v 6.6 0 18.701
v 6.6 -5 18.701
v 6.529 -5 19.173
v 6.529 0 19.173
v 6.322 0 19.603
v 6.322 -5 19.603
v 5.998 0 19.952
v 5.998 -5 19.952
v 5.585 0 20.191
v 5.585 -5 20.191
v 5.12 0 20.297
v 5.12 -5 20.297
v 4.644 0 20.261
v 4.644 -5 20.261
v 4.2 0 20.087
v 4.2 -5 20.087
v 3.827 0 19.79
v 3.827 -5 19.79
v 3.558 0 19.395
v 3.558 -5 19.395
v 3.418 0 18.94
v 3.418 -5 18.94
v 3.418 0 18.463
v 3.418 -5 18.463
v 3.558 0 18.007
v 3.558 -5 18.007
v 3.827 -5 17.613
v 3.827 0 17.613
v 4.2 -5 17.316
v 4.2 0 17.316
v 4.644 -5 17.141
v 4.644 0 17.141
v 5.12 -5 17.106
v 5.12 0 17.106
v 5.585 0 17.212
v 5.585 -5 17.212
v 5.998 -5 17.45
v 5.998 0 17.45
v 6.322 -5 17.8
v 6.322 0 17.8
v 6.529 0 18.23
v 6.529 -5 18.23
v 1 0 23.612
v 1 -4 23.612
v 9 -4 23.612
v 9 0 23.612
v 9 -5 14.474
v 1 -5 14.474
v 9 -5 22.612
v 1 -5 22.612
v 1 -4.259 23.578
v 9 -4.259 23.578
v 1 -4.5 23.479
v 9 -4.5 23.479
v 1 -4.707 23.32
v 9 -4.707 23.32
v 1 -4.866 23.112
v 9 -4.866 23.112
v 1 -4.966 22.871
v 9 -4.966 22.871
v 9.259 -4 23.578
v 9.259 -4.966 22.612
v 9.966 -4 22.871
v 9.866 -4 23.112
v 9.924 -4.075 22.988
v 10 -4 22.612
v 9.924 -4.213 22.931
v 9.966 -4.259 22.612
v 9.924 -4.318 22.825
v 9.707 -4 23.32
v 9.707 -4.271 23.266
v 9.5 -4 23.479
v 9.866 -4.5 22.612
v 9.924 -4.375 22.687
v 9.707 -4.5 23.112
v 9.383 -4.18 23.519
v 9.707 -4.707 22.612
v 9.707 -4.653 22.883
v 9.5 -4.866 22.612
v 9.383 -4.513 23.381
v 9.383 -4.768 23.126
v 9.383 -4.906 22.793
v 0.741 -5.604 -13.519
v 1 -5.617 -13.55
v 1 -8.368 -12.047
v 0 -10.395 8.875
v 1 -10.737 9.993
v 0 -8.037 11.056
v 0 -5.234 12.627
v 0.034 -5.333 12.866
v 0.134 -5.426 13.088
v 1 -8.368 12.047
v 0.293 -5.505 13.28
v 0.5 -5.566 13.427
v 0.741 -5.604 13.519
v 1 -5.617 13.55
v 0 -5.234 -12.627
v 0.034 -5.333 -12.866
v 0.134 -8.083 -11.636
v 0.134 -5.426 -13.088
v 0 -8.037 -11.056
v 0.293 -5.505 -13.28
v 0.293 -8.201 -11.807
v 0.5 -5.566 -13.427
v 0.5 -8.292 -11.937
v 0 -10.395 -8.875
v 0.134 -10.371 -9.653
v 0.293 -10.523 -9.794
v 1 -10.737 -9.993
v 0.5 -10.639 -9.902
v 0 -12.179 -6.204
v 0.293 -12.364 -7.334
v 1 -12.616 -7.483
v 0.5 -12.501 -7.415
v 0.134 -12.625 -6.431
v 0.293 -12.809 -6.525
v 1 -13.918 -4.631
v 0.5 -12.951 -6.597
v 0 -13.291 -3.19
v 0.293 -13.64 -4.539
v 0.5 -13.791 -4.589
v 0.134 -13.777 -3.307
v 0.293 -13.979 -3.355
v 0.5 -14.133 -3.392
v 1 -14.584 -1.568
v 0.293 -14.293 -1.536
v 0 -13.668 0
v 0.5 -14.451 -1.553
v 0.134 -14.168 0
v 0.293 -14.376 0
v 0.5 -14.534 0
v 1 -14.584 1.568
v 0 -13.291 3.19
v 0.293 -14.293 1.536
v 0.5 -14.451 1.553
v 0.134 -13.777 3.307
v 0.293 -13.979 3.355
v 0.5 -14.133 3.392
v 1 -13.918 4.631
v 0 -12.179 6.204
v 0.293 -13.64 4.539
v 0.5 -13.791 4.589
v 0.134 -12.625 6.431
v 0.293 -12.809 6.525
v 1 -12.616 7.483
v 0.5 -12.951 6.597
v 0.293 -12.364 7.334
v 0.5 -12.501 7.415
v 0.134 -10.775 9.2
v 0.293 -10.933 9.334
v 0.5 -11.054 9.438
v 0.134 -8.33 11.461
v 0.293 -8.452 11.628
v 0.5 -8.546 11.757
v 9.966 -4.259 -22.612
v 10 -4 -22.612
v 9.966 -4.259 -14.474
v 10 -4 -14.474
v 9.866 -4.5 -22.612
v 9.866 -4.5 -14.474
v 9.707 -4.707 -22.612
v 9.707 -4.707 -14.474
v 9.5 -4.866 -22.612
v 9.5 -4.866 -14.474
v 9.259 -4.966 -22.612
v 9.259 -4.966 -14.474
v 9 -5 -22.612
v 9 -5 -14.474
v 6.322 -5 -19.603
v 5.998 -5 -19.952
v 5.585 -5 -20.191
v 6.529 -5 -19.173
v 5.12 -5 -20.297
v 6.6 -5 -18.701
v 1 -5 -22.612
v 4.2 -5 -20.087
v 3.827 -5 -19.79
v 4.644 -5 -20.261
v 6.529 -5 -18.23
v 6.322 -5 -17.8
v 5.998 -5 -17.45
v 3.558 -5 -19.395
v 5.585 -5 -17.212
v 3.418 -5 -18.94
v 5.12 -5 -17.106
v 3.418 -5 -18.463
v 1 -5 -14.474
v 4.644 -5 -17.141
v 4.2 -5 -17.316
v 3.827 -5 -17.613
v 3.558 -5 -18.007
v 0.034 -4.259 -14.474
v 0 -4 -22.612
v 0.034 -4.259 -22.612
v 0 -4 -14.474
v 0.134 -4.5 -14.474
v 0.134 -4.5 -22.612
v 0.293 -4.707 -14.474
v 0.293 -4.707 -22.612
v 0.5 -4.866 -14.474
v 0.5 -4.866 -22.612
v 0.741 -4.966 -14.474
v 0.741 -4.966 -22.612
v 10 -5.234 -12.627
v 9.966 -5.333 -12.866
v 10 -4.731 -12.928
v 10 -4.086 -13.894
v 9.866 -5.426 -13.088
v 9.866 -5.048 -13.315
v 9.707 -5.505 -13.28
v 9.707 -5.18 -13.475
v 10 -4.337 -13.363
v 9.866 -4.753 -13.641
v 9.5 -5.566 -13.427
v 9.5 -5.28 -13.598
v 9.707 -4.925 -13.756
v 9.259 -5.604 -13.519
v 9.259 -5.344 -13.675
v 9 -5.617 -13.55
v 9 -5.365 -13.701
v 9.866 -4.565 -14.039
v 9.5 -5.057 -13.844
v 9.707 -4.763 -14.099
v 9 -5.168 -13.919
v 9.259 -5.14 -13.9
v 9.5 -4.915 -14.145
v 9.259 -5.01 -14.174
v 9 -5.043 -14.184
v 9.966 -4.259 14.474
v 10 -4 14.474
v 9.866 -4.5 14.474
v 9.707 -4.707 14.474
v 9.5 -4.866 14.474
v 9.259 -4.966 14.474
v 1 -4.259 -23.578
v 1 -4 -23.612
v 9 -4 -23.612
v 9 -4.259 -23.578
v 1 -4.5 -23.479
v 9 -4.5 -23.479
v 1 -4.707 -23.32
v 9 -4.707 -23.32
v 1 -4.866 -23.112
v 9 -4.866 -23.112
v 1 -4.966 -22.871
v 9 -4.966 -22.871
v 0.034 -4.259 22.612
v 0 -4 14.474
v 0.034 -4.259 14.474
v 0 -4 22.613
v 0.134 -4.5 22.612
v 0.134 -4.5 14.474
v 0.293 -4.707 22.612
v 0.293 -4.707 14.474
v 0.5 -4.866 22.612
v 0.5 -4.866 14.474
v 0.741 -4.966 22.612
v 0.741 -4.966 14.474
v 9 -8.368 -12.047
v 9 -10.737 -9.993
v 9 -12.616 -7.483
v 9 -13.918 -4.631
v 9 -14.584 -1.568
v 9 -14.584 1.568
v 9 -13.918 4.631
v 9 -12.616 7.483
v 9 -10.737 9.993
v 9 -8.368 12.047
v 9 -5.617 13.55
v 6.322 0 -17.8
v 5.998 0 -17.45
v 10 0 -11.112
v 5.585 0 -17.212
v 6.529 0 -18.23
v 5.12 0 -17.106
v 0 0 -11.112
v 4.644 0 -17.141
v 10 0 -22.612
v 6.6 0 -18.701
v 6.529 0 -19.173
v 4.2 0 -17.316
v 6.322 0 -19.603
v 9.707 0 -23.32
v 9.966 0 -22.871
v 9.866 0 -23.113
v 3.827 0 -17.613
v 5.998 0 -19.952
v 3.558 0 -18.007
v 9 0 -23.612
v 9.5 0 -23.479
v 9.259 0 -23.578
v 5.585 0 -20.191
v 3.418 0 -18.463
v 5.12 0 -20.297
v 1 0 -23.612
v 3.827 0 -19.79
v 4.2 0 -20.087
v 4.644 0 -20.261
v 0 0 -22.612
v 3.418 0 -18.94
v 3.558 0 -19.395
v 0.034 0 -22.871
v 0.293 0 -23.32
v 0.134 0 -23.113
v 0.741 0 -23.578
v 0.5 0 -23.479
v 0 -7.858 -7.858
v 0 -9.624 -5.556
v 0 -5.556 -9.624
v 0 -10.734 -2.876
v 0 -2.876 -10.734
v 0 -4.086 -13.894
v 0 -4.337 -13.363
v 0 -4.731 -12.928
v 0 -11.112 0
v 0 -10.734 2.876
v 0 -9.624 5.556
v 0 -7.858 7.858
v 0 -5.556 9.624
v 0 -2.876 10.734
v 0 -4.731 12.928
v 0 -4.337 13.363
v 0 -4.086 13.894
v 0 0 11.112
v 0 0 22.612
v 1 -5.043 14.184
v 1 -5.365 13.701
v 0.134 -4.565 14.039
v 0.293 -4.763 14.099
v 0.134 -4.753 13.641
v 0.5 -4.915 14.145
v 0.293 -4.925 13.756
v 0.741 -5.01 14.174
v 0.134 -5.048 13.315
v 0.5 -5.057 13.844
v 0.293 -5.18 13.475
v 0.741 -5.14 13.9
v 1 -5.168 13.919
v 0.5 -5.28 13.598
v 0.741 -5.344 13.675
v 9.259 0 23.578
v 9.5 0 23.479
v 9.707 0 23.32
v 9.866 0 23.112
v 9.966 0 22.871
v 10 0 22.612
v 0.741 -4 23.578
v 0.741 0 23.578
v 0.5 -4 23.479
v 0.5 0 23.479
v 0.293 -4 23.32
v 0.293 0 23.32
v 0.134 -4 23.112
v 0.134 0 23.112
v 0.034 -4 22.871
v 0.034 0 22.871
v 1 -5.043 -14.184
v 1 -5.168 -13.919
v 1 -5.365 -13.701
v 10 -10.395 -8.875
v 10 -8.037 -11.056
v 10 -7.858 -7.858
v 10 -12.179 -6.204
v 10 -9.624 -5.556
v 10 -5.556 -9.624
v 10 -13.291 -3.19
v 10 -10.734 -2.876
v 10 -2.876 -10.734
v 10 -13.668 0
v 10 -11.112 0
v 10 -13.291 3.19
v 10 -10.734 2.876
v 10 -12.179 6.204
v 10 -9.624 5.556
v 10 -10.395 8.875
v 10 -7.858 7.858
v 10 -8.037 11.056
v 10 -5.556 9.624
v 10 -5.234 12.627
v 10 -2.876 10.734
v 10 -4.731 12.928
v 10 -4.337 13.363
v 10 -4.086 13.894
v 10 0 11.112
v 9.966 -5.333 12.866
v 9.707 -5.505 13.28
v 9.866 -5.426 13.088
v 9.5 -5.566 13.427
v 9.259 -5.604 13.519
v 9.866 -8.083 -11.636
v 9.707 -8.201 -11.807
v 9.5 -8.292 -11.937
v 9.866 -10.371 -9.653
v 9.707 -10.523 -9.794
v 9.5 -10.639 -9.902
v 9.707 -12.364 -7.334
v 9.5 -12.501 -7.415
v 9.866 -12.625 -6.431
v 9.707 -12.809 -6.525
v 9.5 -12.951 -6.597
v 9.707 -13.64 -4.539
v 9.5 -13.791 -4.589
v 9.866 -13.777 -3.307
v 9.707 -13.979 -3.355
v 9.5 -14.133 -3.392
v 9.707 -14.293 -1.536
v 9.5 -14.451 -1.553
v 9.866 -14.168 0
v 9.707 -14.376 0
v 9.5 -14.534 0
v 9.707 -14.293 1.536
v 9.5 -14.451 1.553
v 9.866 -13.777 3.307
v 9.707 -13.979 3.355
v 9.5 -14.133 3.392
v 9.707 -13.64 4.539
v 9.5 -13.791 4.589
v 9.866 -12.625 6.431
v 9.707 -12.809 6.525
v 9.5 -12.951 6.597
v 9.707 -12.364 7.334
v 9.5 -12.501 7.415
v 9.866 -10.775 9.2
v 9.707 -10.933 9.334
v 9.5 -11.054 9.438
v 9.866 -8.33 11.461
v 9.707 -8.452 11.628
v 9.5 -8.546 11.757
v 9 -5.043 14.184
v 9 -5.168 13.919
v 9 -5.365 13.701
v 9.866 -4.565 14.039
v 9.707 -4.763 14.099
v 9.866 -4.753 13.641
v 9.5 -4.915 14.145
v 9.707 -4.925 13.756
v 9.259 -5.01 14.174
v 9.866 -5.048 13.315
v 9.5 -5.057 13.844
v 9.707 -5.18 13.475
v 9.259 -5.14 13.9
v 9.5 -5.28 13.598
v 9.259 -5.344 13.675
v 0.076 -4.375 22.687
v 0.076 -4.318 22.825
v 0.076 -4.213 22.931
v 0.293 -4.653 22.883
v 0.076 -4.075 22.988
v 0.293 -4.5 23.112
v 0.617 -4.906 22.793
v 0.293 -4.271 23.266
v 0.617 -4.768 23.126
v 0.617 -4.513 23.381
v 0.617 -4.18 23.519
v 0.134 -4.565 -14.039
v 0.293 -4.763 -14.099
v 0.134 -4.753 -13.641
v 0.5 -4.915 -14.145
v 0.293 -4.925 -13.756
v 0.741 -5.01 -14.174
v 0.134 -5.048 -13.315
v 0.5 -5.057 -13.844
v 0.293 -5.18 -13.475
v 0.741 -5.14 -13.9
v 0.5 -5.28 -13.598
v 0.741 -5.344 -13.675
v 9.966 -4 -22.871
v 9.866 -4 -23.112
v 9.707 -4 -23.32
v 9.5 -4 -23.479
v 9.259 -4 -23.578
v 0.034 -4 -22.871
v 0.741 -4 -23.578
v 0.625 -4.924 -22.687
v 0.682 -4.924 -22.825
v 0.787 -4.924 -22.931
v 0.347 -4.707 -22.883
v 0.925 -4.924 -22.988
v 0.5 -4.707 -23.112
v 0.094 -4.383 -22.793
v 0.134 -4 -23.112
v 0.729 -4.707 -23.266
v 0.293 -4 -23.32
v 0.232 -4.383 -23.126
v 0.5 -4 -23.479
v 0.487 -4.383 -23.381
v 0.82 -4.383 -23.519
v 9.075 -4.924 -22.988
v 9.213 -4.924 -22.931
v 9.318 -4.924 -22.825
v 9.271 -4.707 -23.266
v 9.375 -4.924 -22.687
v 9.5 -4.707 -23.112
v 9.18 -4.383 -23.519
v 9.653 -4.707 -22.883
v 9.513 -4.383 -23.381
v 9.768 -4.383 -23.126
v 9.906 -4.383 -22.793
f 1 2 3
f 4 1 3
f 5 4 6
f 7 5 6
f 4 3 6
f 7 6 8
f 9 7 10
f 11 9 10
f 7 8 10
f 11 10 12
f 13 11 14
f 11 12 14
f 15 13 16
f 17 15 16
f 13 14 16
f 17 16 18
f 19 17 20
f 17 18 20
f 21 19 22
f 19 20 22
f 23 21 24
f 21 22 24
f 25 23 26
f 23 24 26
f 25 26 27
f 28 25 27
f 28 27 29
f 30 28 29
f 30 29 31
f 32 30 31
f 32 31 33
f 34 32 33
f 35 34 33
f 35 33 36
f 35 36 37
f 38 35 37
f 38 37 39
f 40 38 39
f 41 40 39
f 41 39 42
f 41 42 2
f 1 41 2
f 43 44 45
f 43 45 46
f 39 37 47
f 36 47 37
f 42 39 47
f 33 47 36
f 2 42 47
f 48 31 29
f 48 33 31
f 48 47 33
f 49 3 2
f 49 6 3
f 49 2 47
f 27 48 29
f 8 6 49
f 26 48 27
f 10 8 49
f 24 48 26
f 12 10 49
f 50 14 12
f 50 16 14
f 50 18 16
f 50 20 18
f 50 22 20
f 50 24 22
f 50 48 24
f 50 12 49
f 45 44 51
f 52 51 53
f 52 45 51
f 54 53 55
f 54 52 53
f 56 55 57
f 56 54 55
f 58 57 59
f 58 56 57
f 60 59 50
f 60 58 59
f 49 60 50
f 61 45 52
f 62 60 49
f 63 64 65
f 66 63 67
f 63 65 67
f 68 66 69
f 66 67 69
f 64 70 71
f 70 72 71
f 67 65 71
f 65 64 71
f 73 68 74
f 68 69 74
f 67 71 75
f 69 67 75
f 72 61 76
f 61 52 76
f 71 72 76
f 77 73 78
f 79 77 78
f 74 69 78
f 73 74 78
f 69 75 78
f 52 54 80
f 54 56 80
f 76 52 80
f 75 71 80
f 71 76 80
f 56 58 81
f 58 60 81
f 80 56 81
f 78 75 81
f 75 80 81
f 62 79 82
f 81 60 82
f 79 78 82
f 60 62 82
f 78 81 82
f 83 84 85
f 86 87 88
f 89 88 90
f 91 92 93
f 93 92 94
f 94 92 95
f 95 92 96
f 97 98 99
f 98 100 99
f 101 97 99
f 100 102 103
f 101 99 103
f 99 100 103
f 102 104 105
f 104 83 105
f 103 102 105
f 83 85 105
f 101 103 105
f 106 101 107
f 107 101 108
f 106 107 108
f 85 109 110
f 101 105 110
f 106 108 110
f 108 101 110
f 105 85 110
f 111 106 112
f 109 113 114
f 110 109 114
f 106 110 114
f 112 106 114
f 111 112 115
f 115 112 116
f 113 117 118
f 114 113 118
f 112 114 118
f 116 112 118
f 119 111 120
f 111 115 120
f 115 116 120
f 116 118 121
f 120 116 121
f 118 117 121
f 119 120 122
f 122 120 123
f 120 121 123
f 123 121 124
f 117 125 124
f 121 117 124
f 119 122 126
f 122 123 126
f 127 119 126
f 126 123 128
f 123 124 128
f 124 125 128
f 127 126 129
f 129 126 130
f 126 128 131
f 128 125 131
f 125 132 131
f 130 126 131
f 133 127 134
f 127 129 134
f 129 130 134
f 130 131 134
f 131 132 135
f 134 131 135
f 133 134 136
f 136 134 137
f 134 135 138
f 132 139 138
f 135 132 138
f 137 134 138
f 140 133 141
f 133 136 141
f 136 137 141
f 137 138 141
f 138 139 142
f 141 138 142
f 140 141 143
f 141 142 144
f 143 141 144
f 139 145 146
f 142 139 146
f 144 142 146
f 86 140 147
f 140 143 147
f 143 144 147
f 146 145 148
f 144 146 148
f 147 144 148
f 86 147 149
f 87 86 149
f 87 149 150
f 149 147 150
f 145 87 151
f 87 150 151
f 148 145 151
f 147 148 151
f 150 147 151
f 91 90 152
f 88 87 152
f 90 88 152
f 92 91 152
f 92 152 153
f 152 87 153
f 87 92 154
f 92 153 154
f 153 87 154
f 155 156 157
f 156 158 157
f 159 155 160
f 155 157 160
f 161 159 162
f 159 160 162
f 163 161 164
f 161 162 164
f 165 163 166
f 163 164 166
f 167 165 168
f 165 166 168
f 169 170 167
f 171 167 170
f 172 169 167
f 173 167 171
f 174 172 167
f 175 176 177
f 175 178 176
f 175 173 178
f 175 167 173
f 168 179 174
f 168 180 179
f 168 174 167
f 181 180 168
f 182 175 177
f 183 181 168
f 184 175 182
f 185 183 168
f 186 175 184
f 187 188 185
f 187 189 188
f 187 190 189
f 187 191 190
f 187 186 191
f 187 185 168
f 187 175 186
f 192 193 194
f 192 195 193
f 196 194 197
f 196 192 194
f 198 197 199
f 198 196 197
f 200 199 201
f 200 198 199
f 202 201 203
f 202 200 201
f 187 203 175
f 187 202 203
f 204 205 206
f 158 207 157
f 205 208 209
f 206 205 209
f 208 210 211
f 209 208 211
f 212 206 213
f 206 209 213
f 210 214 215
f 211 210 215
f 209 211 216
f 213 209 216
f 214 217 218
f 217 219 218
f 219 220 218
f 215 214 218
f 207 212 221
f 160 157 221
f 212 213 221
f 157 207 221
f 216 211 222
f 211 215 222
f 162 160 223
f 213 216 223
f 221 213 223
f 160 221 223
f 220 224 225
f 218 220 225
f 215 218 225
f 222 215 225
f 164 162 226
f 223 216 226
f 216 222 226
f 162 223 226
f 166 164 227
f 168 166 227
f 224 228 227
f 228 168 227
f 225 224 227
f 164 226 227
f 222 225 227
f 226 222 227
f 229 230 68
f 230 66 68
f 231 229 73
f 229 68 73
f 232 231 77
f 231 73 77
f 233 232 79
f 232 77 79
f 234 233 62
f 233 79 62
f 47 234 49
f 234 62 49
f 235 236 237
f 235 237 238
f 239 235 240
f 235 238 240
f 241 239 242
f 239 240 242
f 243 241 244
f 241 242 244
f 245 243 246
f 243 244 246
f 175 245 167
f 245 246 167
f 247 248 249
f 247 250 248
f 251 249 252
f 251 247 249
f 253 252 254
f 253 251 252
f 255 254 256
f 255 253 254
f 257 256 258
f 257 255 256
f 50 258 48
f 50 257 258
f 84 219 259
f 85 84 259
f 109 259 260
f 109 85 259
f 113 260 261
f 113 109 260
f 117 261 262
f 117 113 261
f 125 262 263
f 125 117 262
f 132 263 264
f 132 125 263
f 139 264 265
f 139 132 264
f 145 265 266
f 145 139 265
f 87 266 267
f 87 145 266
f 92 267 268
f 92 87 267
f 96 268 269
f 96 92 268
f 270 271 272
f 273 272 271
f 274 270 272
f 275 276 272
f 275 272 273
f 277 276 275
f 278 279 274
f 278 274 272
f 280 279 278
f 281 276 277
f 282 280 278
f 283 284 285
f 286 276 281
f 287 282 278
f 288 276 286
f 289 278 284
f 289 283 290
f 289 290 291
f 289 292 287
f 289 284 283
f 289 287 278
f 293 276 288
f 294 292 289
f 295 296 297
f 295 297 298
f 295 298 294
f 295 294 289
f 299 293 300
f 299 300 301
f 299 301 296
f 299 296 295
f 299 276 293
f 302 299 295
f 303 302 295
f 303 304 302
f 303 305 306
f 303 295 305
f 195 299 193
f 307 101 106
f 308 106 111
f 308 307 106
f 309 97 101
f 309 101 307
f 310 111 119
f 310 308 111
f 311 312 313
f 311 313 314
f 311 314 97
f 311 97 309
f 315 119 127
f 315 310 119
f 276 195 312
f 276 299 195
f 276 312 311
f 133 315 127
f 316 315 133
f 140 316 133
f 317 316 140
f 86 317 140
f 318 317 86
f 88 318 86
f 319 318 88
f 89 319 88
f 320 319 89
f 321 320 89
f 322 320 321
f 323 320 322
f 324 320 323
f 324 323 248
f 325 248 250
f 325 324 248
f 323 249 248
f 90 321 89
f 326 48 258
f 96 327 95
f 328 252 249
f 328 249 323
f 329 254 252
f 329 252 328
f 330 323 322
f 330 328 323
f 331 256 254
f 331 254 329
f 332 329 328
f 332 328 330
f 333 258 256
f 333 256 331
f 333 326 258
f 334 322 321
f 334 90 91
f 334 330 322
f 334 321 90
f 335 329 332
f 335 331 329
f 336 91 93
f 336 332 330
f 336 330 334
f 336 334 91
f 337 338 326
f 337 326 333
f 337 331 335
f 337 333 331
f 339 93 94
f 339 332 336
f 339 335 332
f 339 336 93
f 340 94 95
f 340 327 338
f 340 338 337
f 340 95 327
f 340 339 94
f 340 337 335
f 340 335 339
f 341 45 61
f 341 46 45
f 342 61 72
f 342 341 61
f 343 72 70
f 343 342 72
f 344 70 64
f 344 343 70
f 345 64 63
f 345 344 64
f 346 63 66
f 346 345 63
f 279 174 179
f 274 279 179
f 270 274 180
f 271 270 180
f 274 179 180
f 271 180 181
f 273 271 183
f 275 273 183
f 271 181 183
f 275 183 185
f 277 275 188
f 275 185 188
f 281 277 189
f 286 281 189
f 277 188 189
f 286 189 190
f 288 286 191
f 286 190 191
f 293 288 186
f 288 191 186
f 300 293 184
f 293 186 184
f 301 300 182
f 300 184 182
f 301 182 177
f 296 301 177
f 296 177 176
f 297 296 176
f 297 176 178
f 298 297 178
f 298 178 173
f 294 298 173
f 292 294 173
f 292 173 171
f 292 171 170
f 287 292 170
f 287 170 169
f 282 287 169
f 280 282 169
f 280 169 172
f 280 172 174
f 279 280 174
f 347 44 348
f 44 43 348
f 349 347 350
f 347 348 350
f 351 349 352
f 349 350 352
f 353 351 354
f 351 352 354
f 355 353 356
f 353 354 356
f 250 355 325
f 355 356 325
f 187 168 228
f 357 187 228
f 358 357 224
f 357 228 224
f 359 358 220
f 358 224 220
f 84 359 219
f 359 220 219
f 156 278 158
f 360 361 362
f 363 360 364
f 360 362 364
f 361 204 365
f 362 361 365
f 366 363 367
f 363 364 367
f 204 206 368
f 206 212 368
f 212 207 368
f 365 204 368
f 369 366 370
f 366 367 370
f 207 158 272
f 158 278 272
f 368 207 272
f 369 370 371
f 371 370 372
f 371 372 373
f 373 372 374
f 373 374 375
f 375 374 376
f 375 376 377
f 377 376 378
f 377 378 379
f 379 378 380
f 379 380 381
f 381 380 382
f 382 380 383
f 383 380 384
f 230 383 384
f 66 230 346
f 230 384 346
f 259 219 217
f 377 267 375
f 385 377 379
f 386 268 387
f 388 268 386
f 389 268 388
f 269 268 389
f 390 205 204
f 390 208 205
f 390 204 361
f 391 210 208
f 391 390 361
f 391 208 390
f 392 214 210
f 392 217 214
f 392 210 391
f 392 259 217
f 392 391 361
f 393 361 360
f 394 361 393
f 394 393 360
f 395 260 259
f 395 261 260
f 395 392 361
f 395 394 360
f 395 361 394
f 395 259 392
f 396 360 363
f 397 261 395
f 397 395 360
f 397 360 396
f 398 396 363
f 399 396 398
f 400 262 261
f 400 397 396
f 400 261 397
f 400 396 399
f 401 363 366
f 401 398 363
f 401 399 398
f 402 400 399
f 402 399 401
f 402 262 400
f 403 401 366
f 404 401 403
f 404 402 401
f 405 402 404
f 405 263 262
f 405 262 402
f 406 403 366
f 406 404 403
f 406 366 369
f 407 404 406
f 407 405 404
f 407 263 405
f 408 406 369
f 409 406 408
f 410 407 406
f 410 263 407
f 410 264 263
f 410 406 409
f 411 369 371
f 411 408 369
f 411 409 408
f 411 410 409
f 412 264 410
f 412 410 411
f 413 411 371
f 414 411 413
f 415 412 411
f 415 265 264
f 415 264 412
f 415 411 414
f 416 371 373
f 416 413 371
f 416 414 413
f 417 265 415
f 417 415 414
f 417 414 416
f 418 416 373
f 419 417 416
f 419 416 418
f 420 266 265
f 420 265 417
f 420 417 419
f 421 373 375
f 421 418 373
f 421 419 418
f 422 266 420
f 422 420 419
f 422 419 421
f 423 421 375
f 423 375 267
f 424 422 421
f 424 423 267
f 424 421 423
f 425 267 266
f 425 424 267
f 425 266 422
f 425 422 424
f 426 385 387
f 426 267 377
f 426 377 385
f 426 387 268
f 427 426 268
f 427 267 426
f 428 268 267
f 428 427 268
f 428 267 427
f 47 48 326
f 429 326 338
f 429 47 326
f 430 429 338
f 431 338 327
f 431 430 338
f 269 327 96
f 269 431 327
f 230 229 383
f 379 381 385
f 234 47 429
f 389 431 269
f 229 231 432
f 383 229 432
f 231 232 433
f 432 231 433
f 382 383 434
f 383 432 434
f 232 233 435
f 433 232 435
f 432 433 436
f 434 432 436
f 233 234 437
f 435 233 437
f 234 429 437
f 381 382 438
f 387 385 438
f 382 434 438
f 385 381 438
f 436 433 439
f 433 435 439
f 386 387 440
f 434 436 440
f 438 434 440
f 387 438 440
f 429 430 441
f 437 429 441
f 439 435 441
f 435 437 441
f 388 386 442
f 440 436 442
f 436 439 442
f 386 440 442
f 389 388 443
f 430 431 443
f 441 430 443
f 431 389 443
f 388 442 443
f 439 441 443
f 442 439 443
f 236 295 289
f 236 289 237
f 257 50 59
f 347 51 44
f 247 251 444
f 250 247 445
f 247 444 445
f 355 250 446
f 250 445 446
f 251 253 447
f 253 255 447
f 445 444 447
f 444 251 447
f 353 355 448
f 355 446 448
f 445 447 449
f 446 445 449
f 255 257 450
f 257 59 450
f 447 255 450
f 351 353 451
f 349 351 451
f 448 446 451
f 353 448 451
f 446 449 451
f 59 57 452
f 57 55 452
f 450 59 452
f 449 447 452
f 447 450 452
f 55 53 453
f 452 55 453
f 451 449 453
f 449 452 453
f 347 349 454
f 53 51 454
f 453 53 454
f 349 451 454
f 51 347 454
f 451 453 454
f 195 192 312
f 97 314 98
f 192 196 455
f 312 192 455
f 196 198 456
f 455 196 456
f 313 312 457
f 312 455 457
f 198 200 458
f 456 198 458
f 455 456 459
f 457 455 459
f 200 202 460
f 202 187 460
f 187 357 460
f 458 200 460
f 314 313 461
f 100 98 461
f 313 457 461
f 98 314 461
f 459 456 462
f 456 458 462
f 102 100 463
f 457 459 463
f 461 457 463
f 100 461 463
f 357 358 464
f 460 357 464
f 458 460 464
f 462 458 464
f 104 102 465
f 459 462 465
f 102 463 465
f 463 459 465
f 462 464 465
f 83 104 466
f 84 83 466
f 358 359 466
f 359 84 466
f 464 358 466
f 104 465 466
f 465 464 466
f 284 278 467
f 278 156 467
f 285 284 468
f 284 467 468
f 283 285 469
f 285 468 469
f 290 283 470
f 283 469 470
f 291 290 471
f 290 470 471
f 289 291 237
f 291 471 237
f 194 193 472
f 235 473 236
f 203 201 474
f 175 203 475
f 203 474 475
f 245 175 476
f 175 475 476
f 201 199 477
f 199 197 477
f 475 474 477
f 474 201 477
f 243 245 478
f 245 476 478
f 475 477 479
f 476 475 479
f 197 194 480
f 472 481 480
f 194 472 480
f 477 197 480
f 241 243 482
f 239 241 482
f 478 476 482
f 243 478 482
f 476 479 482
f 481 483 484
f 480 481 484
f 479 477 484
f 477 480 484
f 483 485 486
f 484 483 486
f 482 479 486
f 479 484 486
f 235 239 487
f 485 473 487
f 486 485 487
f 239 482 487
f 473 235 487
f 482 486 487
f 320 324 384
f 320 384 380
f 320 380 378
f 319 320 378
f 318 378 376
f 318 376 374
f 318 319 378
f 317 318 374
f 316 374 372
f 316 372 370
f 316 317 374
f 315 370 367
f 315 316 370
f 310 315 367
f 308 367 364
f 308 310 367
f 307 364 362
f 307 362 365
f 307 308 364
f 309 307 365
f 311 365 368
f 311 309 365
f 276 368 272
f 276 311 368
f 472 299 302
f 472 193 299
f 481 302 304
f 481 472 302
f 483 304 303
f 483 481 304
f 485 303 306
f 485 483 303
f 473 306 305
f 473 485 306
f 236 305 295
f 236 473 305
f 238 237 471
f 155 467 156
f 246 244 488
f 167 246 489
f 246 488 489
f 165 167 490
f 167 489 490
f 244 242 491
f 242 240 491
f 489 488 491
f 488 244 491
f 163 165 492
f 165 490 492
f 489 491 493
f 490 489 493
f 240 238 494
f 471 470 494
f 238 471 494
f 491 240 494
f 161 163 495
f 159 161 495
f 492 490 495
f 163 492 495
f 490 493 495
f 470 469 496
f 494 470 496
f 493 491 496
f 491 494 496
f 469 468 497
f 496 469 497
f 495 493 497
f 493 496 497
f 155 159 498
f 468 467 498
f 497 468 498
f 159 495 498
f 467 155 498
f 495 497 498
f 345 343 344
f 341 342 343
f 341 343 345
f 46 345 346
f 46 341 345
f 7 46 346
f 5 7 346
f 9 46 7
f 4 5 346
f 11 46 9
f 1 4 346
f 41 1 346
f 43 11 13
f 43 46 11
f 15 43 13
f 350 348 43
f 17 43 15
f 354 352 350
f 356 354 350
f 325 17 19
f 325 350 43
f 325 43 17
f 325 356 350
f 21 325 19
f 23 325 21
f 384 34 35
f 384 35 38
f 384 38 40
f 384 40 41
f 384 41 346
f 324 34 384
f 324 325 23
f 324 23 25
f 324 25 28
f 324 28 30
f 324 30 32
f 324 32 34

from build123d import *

# Parameters (mm, degrees)
CLAMP_EXTRUDE_DEPTH     = 10
HOLE_R                  = 1.6
HOLES_CUT_EXTRUDE_DEPTH = 6
FILLET1_R               = 1


with BuildPart() as part:
    # Sketch4 → Clamp Extrude (new body)
    with BuildSketch(Plane(origin=(0, 0, 0), x_dir=(0, 0, -1), z_dir=(1, 0, 0))):
        with BuildLine():
            Line((-23.6125, 0), (-11.1125, 0))
            ThreePointArc((-11.1125, 0), (0, -11.1125), (11.1125, 0))
            Line((11.1125, 0), (23.6125, 0))
            Line((23.6125, 0), (23.6125, -5))
            Line((23.6125, -5), (13.789947652, -5))
            ThreePointArc((13.789947652, -5), (0, -14.668423782), (-13.789947652, -5))
            Line((-13.789947652, -5), (-23.6125, -5))
            Line((-23.6125, -5), (-23.6125, 0))
        make_face()
    extrude(amount=CLAMP_EXTRUDE_DEPTH)

    # Hole → Holes Cut-Extrude (cut, through all)
    with BuildSketch(Plane.XZ.offset(5)):
        with Locations((5, 18.701223826)):
            Circle(HOLE_R)
        with Locations((5, -18.701223826)):
            Circle(HOLE_R)
    extrude(amount=-HOLES_CUT_EXTRUDE_DEPTH, mode=Mode.SUBTRACT)

    # Fillet1
    fillet1_edges = [part.edges().sort_by_distance(p)[0] for p in [
        (0, -2.5, -23.6125),
        (0, -5, -18.701223826),
        (0, -14.668423782, 0),
        (10, -2.5, -23.6125),
        (5, -5, 13.789947652),
        (5, -5, 23.6125),
        (5, -5, -23.6125),
        (5, -5, -13.789947652),
        (10, -2.5, 23.6125),
        (10, -5, 18.701223826),
        (10, -14.668423782, 0),
        (0, -5, 18.701223826),
        (10, -5, -18.701223826),
        (0, -2.5, 23.6125),
    ]]
    fillet(fillet1_edges, radius=FILLET1_R)


solid = part.part
